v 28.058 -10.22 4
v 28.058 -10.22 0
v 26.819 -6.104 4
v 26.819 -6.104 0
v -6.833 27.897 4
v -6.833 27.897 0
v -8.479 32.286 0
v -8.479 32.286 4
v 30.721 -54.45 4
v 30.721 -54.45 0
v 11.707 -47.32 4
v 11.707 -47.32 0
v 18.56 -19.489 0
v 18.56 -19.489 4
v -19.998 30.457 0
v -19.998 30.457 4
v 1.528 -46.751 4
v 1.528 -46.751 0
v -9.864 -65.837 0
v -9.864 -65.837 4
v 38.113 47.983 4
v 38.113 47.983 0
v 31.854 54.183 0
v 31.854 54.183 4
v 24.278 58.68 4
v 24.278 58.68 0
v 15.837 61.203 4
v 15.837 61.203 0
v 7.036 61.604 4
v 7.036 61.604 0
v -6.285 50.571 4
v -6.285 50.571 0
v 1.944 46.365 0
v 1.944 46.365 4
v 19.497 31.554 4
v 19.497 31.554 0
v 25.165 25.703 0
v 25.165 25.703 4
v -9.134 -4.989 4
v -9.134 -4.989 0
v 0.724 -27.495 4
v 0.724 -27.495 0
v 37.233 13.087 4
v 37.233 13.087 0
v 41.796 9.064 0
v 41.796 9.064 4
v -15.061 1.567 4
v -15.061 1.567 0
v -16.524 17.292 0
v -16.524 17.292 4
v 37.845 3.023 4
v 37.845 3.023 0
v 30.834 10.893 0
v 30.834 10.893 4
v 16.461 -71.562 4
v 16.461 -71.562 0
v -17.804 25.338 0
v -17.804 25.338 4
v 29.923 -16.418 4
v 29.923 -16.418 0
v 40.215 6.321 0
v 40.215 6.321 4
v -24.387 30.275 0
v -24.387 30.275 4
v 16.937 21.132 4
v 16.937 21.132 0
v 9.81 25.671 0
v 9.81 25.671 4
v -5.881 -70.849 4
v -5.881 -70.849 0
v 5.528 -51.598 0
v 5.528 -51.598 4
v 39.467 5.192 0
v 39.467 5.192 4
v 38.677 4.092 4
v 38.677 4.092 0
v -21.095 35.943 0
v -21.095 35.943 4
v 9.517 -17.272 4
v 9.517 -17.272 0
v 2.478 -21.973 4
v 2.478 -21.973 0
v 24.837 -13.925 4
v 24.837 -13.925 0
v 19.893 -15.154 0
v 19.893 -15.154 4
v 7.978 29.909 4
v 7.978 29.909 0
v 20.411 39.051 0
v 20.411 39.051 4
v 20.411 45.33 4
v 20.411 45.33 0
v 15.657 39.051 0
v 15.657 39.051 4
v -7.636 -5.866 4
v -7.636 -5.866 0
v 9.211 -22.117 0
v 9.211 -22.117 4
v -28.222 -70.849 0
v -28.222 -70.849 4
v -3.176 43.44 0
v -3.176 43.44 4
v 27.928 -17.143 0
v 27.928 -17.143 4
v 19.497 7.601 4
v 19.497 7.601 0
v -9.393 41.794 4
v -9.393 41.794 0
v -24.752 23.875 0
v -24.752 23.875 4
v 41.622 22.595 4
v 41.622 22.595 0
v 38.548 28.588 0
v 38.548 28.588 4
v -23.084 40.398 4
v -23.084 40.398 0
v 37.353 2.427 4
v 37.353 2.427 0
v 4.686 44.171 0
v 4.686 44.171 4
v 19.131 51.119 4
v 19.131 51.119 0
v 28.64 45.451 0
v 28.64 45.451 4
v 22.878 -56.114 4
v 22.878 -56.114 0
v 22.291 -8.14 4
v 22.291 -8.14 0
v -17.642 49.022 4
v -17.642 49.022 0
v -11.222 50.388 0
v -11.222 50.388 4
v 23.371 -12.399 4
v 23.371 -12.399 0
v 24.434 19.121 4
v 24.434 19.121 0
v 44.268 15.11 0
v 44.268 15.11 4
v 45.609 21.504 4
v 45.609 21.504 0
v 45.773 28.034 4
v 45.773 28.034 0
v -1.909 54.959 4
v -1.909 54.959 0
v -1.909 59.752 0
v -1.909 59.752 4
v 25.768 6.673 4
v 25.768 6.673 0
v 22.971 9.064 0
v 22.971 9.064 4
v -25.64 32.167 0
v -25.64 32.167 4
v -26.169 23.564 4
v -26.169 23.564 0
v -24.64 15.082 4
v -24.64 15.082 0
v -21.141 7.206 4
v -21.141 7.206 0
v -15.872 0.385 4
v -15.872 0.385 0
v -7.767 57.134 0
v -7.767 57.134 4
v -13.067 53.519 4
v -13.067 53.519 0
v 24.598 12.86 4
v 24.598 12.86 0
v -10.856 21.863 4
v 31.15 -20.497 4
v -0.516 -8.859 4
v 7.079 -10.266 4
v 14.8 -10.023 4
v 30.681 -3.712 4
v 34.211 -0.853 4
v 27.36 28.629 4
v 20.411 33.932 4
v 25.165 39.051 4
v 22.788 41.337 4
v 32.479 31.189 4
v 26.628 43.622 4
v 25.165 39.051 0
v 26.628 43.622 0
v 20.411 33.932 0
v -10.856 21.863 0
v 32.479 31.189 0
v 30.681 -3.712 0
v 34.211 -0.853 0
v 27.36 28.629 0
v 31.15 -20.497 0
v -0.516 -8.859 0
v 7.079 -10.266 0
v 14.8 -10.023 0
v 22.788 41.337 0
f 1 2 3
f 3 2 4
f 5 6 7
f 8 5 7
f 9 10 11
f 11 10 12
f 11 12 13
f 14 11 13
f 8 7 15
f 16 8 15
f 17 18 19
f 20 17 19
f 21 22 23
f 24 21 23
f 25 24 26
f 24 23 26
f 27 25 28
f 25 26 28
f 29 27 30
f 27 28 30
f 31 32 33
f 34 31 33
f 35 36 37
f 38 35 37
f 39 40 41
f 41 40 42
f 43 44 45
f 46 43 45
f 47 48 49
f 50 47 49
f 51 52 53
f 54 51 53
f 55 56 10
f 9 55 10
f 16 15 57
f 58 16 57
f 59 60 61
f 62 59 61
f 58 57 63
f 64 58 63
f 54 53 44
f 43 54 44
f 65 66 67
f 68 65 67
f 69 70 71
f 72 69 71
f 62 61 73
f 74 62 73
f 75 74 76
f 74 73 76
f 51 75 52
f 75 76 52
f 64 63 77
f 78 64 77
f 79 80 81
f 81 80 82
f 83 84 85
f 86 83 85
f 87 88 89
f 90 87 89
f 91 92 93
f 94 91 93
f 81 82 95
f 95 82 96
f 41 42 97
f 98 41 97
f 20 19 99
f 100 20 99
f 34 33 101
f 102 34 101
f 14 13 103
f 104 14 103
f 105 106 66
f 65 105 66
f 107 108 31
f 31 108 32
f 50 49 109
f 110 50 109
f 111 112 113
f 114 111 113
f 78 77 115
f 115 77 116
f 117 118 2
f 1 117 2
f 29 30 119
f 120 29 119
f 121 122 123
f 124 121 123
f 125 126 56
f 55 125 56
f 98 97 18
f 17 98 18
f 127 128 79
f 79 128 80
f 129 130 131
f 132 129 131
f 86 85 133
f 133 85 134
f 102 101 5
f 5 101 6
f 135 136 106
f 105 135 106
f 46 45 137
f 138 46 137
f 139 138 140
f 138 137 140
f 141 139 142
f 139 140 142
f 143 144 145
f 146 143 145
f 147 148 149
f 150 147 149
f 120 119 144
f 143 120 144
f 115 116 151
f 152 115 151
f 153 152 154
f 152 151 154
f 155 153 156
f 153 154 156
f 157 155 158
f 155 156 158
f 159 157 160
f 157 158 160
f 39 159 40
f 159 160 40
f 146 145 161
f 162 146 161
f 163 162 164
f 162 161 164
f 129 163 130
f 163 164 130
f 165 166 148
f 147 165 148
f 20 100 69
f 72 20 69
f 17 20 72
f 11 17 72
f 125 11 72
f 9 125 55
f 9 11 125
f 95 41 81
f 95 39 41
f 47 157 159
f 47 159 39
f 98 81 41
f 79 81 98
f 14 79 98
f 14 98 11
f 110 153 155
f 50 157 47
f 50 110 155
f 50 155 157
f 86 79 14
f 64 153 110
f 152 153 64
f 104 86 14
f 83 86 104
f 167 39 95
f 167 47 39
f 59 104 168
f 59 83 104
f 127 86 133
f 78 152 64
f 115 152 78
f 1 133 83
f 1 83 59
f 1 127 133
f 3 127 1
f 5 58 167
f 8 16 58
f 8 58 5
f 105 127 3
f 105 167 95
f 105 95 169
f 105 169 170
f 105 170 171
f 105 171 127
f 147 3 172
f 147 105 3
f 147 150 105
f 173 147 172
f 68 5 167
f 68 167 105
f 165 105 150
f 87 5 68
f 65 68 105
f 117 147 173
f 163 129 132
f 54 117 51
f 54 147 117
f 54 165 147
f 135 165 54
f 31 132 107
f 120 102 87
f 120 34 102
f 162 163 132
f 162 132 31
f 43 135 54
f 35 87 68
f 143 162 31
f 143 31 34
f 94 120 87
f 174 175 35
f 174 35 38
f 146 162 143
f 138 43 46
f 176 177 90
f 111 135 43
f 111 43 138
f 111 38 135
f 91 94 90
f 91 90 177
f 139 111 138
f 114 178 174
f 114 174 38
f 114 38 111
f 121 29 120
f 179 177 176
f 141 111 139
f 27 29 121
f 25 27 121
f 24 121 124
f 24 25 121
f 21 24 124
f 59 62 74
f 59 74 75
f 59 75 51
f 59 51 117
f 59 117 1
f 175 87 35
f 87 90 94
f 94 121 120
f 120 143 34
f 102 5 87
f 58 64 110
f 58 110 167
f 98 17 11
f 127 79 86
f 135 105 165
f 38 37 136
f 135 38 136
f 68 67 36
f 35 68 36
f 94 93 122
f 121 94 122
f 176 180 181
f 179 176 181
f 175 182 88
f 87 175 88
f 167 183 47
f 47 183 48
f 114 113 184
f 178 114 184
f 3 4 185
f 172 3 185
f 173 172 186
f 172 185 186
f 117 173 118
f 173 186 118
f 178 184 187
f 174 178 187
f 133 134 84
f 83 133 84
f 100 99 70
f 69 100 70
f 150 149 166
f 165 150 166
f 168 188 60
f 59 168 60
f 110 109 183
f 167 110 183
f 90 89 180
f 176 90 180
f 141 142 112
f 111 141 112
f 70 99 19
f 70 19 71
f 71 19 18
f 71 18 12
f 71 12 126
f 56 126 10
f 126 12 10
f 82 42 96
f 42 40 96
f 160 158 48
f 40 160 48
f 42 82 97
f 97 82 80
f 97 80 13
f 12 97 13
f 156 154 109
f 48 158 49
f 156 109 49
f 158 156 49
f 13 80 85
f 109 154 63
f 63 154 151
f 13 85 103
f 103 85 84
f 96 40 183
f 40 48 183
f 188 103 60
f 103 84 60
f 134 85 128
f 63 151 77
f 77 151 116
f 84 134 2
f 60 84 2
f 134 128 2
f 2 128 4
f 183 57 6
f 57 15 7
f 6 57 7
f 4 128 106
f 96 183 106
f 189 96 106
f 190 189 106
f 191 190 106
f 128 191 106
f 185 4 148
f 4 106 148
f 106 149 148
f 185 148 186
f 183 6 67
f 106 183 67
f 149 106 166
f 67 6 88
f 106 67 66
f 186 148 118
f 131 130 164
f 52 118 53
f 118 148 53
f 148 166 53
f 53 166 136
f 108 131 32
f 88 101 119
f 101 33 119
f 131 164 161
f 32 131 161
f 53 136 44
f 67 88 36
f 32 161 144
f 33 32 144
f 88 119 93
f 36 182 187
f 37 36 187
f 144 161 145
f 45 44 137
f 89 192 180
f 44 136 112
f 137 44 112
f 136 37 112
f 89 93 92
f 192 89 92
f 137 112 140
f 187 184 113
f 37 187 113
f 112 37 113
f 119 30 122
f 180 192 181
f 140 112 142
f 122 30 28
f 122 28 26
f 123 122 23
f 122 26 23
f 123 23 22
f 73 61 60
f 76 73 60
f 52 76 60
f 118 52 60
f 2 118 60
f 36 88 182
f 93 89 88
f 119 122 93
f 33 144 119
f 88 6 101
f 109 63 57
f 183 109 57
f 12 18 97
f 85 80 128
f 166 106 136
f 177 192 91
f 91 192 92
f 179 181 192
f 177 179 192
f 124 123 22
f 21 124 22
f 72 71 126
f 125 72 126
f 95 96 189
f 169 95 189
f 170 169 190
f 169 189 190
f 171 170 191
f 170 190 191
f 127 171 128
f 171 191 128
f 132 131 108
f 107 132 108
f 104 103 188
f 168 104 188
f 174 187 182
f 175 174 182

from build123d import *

# Parameters (mm, degrees)
F1_DEPTH = 4


with BuildPart() as f1:
    # F0 (on Top) → F1 (new body)
    with BuildSketch(Plane.XY):
        with BuildLine():
            Line((-9.863807, -65.836951), (-28.221913, -70.849411))
            Line((-28.221913, -70.849411), (-5.88068, -70.849411))
            Line((-5.88068, -70.849411), (5.52761, -51.597916))
            Line((5.52761, -51.597916), (22.877717, -56.113698))
            Line((22.877717, -56.113698), (16.460553, -71.562424))
            Line((16.460553, -71.562424), (30.720916, -54.44999))
            Line((30.720916, -54.44999), (11.707101, -47.319807))
            Line((11.707101, -47.319807), (18.559989, -19.489294))
            Line((18.559989, -19.489294), (27.928099, -17.142748))
            Line((27.928099, -17.142748), (31.150259, -20.496517))
            Line((31.150259, -20.496517), (29.922873, -16.418136))
            Line((29.922873, -16.418136), (40.215254, 6.320762))
            ThreePointArc((40.215254, 6.320762), (39.07685, 4.638557), (37.845484, 3.023156))
            Line((37.845484, 3.023156), (30.833699, 10.89257))
            Line((30.833699, 10.89257), (37.233405, 13.086755))
            Line((37.233405, 13.086755), (41.796244, 9.064083))
            ThreePointArc((41.796244, 9.064083), (45.083627, 18.276724), (45.772686, 28.03402))
            Line((45.772686, 28.03402), (41.621767, 22.594886))
            Line((41.621767, 22.594886), (38.548019, 28.587904))
            Line((38.548019, 28.587904), (32.479335, 31.188771))
            Line((32.479335, 31.188771), (27.359569, 28.628892))
            Line((27.359569, 28.628892), (20.41132, 33.931505))
            Line((20.41132, 33.931505), (7.97761, 29.908832))
            Line((7.97761, 29.908832), (20.41132, 39.051265))
            Line((20.41132, 39.051265), (25.165388, 39.051265))
            Line((25.165388, 39.051265), (26.628176, 43.622486))
            Line((26.628176, 43.622486), (22.788357, 41.336875))
            Line((22.788357, 41.336875), (20.41132, 45.33029))
            Line((20.41132, 45.33029), (15.657255, 39.051265))
            Line((15.657255, 39.051265), (19.131379, 51.119279))
            Line((19.131379, 51.119279), (28.63951, 45.450971))
            Line((28.63951, 45.450971), (38.112831, 47.983287))
            ThreePointArc((38.112831, 47.983287), (24.277711, 58.679623), (7.036208, 61.604132))
            Line((7.036208, 61.604132), (4.686333, 44.171032))
            Line((4.686333, 44.171032), (-1.90921, 54.959098))
            Line((-1.90921, 54.959098), (-1.90921, 59.75246))
            ThreePointArc((-1.90921, 59.75246), (-10.497436, 55.445101), (-17.642448, 49.021725))
            Line((-17.642448, 49.021725), (-11.221501, 50.387885))
            Line((-11.221501, 50.387885), (-9.393012, 41.793998))
            Line((-9.393012, 41.793998), (-6.284588, 50.570734))
            Line((-6.284588, 50.570734), (1.943606, 46.365213))
            Line((1.943606, 46.365213), (-3.17616, 43.439634))
            Line((-3.17616, 43.439634), (-6.833133, 27.897498))
            Line((-6.833133, 27.897498), (-8.47877, 32.285865))
            Line((-8.47877, 32.285865), (-19.998237, 30.457377))
            Line((-19.998237, 30.457377), (-17.804054, 25.337616))
            Line((-17.804054, 25.337616), (-24.386607, 30.274531))
            Line((-24.386607, 30.274531), (-21.09533, 35.942841))
            Line((-21.09533, 35.942841), (-23.083921, 40.398134))
            ThreePointArc((-23.083921, 40.398134), (-24.639853, 15.082316), (-9.133734, -4.989351))
            Line((-9.133734, -4.989351), (0.724342, -27.495166))
            Line((0.724342, -27.495166), (9.211371, -22.117248))
            Line((9.211371, -22.117248), (1.528105, -46.750505))
            Line((1.528105, -46.750505), (-9.863807, -65.836951))
        make_face()
        with BuildLine():
            ThreePointArc((-7.636228, -5.865513), (7.079238, -10.265979), (22.290661, -8.13956))
            Line((22.290661, -8.13956), (9.517227, -17.271729))
            Line((9.517227, -17.271729), (2.47791, -21.973379))
            Line((2.47791, -21.973379), (-7.636228, -5.865513))
        make_face(mode=Mode.SUBTRACT)
        Polygon((23.370633, -12.399131), (24.836801, -13.925185), (19.892599, -15.154307), align=None, mode=Mode.SUBTRACT)
        Polygon((-16.524114, 17.292272), (-24.752304, 23.874825), (-10.855804, 21.863492), (-15.061324, 1.567287), align=None, mode=Mode.SUBTRACT)
        Polygon((25.768461, 6.672658), (22.971205, 9.064083), (24.597929, 12.859768), align=None, mode=Mode.SUBTRACT)
        Polygon((24.433995, 19.12076), (19.497076, 7.601293), (16.937198, 21.132095), (9.809952, 25.670725), (19.497076, 31.554472), (25.165388, 25.703313), align=None, mode=Mode.SUBTRACT)
        with BuildLine():
            Line((28.05753, -10.219939), (26.818711, -6.103566))
            ThreePointArc((26.818711, -6.103566), (32.490768, -2.337917), (37.353444, 2.427242))
            Line((37.353444, 2.427242), (28.05753, -10.219939))
        make_face(mode=Mode.SUBTRACT)
    extrude(amount=F1_DEPTH)


solid = f1.part
